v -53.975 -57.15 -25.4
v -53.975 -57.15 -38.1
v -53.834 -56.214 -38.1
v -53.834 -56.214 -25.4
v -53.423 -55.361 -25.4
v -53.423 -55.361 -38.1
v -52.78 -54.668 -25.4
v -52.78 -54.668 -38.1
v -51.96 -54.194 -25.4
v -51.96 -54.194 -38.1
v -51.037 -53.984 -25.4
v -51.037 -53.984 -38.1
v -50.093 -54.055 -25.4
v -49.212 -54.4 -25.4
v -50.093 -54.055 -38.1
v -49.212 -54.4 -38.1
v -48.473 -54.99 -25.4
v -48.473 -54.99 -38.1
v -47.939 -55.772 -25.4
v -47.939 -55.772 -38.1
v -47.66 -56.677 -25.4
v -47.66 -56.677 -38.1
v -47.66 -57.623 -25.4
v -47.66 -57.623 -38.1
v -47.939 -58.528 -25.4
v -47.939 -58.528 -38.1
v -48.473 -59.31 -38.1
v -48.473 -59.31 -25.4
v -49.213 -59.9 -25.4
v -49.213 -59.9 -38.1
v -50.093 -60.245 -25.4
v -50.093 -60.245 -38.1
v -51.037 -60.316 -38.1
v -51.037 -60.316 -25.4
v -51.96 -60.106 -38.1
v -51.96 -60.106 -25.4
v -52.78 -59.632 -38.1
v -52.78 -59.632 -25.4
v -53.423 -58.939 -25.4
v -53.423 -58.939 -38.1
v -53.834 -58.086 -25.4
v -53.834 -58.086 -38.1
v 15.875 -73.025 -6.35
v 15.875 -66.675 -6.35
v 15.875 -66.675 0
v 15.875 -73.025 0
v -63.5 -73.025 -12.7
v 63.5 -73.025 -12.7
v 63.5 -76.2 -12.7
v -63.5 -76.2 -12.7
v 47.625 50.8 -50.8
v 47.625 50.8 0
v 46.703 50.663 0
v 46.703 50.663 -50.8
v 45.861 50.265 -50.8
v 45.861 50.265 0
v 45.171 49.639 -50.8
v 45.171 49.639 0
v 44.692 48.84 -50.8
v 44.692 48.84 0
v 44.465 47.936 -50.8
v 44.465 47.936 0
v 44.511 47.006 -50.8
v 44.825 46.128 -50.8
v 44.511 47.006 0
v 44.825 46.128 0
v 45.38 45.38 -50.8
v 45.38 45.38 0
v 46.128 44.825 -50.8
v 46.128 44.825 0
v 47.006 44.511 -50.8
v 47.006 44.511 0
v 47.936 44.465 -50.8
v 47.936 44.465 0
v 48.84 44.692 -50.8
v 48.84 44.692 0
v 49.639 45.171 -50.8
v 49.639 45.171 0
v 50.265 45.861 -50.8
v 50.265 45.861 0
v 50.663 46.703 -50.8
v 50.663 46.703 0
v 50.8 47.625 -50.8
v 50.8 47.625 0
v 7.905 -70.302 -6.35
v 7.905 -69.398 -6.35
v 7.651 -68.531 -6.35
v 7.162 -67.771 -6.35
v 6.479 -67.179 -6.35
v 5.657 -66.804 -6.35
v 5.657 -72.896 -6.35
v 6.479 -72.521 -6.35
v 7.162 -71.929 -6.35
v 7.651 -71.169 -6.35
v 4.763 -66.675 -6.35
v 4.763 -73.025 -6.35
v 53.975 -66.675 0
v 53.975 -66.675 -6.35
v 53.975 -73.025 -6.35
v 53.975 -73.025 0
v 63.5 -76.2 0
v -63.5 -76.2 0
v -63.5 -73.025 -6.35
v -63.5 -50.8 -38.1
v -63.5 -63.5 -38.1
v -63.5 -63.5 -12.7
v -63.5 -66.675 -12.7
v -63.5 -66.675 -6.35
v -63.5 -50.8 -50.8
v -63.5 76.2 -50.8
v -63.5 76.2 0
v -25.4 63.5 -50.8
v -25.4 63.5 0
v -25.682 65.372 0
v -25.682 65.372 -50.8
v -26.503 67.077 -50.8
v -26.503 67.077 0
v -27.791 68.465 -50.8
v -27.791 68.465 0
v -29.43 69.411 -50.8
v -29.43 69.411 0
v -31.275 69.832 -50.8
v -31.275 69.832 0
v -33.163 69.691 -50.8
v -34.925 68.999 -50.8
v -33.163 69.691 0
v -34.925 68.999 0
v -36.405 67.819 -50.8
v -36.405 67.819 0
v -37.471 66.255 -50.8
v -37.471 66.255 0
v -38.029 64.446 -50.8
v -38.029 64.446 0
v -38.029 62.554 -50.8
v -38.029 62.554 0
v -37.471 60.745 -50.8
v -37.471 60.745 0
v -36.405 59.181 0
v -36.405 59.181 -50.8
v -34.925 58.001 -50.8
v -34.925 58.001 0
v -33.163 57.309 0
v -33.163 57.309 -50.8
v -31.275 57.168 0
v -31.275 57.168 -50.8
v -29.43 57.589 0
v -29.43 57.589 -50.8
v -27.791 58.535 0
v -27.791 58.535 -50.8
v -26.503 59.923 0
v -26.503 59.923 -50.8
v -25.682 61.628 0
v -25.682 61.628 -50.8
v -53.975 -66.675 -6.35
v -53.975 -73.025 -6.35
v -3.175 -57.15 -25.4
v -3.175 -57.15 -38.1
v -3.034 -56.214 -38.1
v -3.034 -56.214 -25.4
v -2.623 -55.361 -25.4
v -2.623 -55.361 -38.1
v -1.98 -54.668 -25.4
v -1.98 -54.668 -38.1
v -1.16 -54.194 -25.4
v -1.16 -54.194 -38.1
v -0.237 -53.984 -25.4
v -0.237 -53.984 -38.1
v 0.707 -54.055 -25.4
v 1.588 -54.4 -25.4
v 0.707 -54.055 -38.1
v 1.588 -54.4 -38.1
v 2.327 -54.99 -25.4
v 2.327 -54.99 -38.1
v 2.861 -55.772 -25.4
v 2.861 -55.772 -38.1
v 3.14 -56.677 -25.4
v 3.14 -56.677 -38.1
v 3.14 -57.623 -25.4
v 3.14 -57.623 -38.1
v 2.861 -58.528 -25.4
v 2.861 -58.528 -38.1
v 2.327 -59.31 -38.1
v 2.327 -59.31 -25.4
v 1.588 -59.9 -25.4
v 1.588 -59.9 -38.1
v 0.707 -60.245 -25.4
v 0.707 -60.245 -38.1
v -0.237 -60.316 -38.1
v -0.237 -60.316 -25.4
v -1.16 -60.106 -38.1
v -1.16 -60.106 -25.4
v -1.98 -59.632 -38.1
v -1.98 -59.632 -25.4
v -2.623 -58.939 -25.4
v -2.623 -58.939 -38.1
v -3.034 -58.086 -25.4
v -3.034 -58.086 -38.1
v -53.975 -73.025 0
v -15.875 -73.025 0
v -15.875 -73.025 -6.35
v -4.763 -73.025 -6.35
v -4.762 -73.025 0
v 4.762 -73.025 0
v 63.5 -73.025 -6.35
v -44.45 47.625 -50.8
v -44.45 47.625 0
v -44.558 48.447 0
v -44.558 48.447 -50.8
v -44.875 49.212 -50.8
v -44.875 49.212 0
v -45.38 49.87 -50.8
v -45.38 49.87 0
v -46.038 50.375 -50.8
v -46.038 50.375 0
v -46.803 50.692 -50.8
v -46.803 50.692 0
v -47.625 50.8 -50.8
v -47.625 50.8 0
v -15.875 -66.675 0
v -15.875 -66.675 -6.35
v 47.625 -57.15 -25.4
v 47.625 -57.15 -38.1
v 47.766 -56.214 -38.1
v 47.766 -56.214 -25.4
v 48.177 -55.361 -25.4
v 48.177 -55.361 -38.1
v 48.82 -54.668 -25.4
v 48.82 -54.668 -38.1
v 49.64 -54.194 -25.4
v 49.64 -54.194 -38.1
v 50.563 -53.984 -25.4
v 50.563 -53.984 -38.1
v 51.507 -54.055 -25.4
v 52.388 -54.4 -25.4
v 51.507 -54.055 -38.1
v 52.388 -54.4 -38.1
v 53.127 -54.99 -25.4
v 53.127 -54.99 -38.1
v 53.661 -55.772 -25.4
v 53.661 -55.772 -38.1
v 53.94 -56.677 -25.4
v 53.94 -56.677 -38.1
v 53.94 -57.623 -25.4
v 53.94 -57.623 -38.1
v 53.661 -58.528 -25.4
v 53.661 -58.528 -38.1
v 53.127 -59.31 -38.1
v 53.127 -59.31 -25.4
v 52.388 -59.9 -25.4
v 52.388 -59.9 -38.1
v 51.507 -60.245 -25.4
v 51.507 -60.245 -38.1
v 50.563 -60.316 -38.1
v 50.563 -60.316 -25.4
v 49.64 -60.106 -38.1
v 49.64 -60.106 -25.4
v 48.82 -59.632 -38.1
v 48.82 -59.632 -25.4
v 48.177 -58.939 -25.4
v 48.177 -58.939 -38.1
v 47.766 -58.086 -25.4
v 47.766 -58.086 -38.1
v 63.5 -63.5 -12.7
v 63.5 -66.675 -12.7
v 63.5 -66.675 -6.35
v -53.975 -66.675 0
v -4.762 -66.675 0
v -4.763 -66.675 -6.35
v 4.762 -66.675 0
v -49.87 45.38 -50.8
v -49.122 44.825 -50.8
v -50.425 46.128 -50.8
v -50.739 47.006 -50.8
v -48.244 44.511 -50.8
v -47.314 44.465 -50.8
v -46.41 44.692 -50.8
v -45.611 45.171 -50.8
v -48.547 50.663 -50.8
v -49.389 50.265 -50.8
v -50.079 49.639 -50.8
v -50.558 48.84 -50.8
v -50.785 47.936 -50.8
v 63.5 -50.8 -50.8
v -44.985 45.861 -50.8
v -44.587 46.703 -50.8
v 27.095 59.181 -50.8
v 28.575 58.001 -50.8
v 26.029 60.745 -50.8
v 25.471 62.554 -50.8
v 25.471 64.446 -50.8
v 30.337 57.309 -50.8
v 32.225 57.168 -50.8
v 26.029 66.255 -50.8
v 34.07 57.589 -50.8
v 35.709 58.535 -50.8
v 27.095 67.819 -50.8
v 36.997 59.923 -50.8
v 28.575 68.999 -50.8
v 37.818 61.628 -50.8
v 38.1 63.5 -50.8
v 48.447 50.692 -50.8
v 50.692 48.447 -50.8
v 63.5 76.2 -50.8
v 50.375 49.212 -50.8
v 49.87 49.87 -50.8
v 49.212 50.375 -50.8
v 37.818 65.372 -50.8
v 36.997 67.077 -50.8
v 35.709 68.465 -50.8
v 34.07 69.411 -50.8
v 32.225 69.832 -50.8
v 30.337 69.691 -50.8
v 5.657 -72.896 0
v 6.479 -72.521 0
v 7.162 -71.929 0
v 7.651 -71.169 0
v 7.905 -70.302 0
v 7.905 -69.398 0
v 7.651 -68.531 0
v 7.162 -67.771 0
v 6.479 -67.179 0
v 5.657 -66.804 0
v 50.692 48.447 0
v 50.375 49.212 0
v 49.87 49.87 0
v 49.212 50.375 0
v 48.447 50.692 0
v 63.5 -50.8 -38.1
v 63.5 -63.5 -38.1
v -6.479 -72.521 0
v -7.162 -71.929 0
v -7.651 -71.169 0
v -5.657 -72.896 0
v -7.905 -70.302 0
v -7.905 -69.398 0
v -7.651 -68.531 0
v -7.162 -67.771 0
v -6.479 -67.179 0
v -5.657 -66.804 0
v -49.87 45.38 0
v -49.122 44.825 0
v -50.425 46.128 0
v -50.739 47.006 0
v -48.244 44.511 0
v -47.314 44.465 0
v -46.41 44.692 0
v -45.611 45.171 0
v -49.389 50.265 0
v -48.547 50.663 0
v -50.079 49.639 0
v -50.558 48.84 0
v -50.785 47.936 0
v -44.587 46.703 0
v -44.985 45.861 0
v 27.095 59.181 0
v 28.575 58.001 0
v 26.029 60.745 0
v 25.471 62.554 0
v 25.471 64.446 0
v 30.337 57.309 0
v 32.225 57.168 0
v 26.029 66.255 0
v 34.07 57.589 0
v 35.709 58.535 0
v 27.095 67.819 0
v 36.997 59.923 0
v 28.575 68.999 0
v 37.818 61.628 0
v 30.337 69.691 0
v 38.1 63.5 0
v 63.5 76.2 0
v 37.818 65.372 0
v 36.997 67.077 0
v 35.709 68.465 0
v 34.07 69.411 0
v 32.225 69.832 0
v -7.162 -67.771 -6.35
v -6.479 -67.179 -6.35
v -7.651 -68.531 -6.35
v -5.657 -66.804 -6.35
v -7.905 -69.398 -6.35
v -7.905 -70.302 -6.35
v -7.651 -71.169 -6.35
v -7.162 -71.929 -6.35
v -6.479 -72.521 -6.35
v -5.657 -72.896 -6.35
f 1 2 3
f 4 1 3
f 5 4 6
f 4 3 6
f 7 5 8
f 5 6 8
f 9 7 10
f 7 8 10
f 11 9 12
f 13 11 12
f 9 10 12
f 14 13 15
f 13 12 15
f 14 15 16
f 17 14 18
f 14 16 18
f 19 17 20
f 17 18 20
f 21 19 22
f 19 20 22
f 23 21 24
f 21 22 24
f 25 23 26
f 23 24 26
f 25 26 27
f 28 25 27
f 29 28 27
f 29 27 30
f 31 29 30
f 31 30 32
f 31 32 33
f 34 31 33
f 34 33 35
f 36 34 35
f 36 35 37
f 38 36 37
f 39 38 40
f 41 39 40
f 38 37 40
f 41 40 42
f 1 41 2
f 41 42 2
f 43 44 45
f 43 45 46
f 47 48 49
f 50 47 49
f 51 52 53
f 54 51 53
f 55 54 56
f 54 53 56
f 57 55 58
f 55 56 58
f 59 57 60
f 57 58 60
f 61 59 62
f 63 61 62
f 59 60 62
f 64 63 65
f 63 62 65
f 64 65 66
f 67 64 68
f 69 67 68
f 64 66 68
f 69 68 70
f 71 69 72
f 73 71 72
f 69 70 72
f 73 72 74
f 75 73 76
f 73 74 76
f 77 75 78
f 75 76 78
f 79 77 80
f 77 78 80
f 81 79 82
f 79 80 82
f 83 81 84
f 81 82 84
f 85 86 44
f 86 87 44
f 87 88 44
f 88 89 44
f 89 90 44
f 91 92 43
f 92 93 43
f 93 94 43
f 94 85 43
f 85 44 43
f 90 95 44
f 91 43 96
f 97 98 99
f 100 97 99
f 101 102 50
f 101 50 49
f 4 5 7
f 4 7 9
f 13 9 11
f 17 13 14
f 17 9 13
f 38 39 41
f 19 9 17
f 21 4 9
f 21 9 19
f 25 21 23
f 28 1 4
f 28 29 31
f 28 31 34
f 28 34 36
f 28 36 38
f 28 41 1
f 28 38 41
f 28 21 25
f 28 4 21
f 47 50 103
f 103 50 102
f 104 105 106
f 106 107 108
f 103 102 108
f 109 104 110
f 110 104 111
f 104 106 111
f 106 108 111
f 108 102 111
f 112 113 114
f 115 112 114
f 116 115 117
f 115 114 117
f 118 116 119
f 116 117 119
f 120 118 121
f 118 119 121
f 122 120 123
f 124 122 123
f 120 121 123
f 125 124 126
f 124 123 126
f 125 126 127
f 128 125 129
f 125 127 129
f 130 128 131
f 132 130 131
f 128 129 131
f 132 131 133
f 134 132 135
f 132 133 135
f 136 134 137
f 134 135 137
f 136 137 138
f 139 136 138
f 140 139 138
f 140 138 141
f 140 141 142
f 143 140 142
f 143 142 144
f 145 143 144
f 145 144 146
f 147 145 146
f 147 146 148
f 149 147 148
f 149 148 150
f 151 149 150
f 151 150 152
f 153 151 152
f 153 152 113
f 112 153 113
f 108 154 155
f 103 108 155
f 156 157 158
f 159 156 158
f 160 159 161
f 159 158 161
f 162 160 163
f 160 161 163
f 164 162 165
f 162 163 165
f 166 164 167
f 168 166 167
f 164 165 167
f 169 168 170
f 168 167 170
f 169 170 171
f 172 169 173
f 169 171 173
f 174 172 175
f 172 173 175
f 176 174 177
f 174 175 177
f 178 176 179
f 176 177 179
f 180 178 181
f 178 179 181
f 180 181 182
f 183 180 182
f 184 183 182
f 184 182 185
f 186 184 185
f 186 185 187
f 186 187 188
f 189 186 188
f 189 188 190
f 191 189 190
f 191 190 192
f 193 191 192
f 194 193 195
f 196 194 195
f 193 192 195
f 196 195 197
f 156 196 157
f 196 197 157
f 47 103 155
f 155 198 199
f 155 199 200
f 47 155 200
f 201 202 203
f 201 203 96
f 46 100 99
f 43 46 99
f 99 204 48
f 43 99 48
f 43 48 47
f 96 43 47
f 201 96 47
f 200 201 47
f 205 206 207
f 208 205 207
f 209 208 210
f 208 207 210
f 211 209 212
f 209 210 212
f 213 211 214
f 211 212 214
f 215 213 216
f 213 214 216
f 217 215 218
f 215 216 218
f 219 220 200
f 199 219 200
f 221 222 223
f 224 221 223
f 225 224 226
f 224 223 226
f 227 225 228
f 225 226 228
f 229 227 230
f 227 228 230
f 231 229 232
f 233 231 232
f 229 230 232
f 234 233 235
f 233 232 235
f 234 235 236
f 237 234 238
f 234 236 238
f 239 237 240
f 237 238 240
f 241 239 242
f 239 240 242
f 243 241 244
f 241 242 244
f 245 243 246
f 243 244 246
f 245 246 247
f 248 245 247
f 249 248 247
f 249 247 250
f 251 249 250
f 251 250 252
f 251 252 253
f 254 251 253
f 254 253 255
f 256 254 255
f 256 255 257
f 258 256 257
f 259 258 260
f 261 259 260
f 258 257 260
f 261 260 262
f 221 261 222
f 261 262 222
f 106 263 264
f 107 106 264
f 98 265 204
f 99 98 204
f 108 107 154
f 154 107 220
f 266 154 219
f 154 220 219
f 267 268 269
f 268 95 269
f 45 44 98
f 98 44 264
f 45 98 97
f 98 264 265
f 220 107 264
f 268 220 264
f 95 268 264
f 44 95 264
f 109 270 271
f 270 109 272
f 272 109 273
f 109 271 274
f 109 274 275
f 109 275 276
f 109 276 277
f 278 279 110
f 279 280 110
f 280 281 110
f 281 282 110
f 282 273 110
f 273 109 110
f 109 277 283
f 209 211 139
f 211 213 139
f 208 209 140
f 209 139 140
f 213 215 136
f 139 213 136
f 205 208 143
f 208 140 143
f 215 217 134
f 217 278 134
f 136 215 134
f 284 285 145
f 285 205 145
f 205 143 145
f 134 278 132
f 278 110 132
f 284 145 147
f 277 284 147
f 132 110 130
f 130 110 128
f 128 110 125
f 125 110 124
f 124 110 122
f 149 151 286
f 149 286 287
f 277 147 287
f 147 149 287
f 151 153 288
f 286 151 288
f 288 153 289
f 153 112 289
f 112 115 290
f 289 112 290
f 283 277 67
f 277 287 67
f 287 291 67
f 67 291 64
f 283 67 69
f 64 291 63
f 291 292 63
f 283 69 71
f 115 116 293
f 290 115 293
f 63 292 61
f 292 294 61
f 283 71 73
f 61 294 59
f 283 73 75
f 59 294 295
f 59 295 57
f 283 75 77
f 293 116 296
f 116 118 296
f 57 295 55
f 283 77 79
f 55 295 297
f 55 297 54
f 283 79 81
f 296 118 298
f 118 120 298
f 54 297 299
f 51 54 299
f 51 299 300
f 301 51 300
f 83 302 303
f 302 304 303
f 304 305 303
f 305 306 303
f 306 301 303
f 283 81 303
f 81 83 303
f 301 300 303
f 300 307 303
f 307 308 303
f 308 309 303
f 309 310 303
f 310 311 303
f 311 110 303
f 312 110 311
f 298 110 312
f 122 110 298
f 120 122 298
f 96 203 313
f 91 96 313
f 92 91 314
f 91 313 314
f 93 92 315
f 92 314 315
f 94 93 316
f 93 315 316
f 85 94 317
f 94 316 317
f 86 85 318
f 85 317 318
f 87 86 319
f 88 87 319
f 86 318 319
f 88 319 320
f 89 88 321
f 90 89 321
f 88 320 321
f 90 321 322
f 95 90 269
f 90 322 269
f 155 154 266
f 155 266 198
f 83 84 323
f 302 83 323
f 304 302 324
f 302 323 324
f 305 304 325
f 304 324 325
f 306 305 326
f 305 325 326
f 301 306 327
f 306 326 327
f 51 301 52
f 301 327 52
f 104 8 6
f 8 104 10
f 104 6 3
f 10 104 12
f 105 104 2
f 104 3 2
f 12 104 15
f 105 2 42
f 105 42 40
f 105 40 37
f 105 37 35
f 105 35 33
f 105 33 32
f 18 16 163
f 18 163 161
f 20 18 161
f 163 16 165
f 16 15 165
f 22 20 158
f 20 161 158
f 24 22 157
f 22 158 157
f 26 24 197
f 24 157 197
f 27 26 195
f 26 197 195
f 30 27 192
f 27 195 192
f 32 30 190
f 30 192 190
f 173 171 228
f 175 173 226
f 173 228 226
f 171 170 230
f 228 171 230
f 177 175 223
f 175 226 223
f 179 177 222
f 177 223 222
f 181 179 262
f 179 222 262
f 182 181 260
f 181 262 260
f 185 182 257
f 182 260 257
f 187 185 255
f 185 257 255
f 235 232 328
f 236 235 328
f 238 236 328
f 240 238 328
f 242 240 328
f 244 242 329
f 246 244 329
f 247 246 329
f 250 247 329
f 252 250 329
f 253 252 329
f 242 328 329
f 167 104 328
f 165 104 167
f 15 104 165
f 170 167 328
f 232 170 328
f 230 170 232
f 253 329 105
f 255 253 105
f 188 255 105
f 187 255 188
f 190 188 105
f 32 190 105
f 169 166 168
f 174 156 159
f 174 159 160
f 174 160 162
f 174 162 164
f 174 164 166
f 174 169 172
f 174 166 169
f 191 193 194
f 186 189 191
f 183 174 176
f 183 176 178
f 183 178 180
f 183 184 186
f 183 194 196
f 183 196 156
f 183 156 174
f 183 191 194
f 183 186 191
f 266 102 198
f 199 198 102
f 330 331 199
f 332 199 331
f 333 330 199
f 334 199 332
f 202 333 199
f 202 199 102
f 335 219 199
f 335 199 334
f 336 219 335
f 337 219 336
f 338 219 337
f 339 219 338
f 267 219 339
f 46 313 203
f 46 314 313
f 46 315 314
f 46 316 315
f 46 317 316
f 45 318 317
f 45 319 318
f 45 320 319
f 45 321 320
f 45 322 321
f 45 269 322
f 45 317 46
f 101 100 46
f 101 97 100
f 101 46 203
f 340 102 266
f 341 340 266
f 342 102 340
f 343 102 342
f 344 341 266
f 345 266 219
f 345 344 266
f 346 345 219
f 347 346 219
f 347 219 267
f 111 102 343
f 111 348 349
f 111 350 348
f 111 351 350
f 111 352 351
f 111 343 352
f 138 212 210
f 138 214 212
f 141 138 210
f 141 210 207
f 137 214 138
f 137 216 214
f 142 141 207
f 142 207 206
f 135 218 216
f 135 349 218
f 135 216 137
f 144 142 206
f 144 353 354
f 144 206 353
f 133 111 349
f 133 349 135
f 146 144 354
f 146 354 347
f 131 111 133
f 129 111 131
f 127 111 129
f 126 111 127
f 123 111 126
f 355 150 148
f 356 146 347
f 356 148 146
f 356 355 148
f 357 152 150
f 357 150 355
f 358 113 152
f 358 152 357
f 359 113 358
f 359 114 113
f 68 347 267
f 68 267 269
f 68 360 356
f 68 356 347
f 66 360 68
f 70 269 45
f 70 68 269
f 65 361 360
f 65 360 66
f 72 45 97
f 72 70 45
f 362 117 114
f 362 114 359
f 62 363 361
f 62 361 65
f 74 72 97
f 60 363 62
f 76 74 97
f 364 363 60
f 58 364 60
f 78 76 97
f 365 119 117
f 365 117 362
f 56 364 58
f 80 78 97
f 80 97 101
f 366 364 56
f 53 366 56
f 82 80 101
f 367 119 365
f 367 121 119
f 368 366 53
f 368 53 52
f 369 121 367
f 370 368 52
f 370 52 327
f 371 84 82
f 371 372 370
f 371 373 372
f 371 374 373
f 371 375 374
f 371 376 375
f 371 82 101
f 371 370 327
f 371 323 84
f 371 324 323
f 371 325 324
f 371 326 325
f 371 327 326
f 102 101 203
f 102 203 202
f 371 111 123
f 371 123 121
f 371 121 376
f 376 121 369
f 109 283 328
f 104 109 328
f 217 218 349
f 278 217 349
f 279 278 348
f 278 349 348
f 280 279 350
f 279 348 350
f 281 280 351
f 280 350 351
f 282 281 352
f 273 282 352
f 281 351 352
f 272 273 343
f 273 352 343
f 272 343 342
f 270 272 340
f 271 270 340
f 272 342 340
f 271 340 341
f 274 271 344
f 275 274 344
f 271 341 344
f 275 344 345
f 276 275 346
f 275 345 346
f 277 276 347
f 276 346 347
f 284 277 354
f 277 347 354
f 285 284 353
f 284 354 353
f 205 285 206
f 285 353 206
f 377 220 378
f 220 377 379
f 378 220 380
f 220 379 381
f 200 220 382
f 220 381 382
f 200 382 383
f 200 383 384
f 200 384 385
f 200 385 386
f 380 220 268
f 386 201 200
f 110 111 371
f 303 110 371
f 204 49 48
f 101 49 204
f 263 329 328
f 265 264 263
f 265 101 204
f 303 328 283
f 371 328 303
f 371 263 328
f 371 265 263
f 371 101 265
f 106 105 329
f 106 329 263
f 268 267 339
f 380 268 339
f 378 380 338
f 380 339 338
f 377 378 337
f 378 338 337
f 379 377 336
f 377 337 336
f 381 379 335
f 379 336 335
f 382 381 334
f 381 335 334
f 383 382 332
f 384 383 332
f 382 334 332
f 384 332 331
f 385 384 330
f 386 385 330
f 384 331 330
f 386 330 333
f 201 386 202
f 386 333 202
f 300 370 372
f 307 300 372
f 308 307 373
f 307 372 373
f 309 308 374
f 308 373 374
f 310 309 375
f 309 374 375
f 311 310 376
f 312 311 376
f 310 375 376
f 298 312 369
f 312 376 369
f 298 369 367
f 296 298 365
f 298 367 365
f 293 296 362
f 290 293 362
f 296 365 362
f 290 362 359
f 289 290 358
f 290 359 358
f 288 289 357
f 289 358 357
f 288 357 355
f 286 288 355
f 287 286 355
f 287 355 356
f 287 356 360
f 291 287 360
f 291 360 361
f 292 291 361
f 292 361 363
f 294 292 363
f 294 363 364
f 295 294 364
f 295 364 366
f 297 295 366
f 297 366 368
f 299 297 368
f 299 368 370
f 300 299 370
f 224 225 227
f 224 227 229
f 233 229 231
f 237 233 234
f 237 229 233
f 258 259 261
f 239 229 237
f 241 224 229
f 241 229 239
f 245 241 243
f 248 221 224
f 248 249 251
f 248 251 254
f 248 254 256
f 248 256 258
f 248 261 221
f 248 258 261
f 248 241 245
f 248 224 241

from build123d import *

# Parameters (mm, degrees)
F0_W      = 127
F0_H      = 152.4
F1_DEPTH  = 50.8
F3_DEPTH  = 127.001
F5_DEPTH  = 12.7
F6_W      = 38.1
F6_H      = 6.35
F7_DEPTH  = 6.351
F8_R      = 6.35
F9_DEPTH  = 50.801
F11_DEPTH = 50.801


with BuildPart() as f1:
    # F0 (on Top) → F1 (new body)
    with BuildSketch(Plane.XY):
        Rectangle(F0_W, F0_H)
    extrude(amount=-F1_DEPTH)

    # F2 (on face) → F3 (cut, through all)
    with BuildSketch(Plane.YZ.offset(63.5)):
        Polygon((-76.2, -12.7), (-76.2, -50.8), (-50.8, -50.8), (-50.8, -38.1), (-63.5, -38.1), (-63.5, -12.7), (-66.675, -12.7), (-66.675, -6.35), (-73.025, -6.35), (-73.025, -12.7), align=None)
    extrude(amount=-F3_DEPTH, mode=Mode.SUBTRACT)

    # F4 (on face) → F5 (cut)
    with BuildSketch(Plane(origin=(0, 0, -38.1), x_dir=(1, 0, 0), z_dir=(0, 0, -1))):
        with BuildLine():
            ThreePointArc((-47.625, 57.15), (-50.8, 60.325), (-53.975, 57.15))
            Line((-53.975, 57.15), (-47.625, 57.15))
        make_face()
        with BuildLine():
            ThreePointArc((53.975, 57.15), (50.8, 60.325), (47.625, 57.15))
            Line((47.625, 57.15), (53.975, 57.15))
        make_face()
        with BuildLine():
            Line((53.975, 57.15), (47.625, 57.15))
            ThreePointArc((47.625, 57.15), (50.8, 53.975), (53.975, 57.15))
        make_face()
        with BuildLine():
            ThreePointArc((3.175, 57.15), (0, 60.325), (-3.175, 57.15))
            Line((-3.175, 57.15), (3.175, 57.15))
        make_face()
        with BuildLine():
            Line((3.175, 57.15), (-3.175, 57.15))
            ThreePointArc((-3.175, 57.15), (0, 53.975), (3.175, 57.15))
        make_face()
        with BuildLine():
            Line((-47.625, 57.15), (-53.975, 57.15))
            ThreePointArc((-53.975, 57.15), (-50.8, 53.975), (-47.625, 57.15))
        make_face()
    extrude(amount=-F5_DEPTH, mode=Mode.SUBTRACT)

    # F6 (on face) → F7 (cut, through all)
    with BuildSketch(Plane(origin=(0, 0, -6.35), x_dir=(1, 0, 0), z_dir=(0, 0, -1))):
        with Locations((-34.925, 69.85)):
            Rectangle(F6_W, F6_H)
        with Locations((34.925, 69.85)):
            Rectangle(F6_W, F6_H)
    extrude(amount=-F7_DEPTH, mode=Mode.SUBTRACT)

    # F8 (on face) → F9 (cut, through all)
    with BuildSketch(Plane.XY):
        with BuildLine():
            ThreePointArc((-38.1, 63.5), (-31.75, 57.15), (-25.4, 63.5))
            ThreePointArc((-25.4, 63.5), (-31.75, 69.85), (-38.1, 63.5))
        make_face()
        with BuildLine():
            ThreePointArc((-44.45, 47.625), (-45.379936, 49.870064), (-47.625, 50.8))
            ThreePointArc((-47.625, 50.8), (-49.870064, 45.379936), (-44.45, 47.625))
        make_face()
        with Locations((31.75, 63.5)):
            Circle(F8_R)
        with BuildLine():
            ThreePointArc((50.8, 47.625), (49.870064, 49.870064), (47.625, 50.8))
            ThreePointArc((47.625, 50.8), (45.379936, 45.379936), (50.8, 47.625))
        make_face()
    extrude(amount=-F9_DEPTH, mode=Mode.SUBTRACT)

    # F10 (on face) → F11 (cut, through all)
    with BuildSketch(Plane.XY):
        with BuildLine():
            Line((4.7625, -66.675), (-4.7625, -66.675))
            ThreePointArc((-4.7625, -66.675), (-7.9375, -69.85), (-4.7625, -73.025))
            Line((-4.7625, -73.025), (4.7625, -73.025))
            ThreePointArc((4.7625, -73.025), (7.9375, -69.85), (4.7625, -66.675))
        make_face()
    extrude(amount=-F11_DEPTH, mode=Mode.SUBTRACT)


solid = f1.part
